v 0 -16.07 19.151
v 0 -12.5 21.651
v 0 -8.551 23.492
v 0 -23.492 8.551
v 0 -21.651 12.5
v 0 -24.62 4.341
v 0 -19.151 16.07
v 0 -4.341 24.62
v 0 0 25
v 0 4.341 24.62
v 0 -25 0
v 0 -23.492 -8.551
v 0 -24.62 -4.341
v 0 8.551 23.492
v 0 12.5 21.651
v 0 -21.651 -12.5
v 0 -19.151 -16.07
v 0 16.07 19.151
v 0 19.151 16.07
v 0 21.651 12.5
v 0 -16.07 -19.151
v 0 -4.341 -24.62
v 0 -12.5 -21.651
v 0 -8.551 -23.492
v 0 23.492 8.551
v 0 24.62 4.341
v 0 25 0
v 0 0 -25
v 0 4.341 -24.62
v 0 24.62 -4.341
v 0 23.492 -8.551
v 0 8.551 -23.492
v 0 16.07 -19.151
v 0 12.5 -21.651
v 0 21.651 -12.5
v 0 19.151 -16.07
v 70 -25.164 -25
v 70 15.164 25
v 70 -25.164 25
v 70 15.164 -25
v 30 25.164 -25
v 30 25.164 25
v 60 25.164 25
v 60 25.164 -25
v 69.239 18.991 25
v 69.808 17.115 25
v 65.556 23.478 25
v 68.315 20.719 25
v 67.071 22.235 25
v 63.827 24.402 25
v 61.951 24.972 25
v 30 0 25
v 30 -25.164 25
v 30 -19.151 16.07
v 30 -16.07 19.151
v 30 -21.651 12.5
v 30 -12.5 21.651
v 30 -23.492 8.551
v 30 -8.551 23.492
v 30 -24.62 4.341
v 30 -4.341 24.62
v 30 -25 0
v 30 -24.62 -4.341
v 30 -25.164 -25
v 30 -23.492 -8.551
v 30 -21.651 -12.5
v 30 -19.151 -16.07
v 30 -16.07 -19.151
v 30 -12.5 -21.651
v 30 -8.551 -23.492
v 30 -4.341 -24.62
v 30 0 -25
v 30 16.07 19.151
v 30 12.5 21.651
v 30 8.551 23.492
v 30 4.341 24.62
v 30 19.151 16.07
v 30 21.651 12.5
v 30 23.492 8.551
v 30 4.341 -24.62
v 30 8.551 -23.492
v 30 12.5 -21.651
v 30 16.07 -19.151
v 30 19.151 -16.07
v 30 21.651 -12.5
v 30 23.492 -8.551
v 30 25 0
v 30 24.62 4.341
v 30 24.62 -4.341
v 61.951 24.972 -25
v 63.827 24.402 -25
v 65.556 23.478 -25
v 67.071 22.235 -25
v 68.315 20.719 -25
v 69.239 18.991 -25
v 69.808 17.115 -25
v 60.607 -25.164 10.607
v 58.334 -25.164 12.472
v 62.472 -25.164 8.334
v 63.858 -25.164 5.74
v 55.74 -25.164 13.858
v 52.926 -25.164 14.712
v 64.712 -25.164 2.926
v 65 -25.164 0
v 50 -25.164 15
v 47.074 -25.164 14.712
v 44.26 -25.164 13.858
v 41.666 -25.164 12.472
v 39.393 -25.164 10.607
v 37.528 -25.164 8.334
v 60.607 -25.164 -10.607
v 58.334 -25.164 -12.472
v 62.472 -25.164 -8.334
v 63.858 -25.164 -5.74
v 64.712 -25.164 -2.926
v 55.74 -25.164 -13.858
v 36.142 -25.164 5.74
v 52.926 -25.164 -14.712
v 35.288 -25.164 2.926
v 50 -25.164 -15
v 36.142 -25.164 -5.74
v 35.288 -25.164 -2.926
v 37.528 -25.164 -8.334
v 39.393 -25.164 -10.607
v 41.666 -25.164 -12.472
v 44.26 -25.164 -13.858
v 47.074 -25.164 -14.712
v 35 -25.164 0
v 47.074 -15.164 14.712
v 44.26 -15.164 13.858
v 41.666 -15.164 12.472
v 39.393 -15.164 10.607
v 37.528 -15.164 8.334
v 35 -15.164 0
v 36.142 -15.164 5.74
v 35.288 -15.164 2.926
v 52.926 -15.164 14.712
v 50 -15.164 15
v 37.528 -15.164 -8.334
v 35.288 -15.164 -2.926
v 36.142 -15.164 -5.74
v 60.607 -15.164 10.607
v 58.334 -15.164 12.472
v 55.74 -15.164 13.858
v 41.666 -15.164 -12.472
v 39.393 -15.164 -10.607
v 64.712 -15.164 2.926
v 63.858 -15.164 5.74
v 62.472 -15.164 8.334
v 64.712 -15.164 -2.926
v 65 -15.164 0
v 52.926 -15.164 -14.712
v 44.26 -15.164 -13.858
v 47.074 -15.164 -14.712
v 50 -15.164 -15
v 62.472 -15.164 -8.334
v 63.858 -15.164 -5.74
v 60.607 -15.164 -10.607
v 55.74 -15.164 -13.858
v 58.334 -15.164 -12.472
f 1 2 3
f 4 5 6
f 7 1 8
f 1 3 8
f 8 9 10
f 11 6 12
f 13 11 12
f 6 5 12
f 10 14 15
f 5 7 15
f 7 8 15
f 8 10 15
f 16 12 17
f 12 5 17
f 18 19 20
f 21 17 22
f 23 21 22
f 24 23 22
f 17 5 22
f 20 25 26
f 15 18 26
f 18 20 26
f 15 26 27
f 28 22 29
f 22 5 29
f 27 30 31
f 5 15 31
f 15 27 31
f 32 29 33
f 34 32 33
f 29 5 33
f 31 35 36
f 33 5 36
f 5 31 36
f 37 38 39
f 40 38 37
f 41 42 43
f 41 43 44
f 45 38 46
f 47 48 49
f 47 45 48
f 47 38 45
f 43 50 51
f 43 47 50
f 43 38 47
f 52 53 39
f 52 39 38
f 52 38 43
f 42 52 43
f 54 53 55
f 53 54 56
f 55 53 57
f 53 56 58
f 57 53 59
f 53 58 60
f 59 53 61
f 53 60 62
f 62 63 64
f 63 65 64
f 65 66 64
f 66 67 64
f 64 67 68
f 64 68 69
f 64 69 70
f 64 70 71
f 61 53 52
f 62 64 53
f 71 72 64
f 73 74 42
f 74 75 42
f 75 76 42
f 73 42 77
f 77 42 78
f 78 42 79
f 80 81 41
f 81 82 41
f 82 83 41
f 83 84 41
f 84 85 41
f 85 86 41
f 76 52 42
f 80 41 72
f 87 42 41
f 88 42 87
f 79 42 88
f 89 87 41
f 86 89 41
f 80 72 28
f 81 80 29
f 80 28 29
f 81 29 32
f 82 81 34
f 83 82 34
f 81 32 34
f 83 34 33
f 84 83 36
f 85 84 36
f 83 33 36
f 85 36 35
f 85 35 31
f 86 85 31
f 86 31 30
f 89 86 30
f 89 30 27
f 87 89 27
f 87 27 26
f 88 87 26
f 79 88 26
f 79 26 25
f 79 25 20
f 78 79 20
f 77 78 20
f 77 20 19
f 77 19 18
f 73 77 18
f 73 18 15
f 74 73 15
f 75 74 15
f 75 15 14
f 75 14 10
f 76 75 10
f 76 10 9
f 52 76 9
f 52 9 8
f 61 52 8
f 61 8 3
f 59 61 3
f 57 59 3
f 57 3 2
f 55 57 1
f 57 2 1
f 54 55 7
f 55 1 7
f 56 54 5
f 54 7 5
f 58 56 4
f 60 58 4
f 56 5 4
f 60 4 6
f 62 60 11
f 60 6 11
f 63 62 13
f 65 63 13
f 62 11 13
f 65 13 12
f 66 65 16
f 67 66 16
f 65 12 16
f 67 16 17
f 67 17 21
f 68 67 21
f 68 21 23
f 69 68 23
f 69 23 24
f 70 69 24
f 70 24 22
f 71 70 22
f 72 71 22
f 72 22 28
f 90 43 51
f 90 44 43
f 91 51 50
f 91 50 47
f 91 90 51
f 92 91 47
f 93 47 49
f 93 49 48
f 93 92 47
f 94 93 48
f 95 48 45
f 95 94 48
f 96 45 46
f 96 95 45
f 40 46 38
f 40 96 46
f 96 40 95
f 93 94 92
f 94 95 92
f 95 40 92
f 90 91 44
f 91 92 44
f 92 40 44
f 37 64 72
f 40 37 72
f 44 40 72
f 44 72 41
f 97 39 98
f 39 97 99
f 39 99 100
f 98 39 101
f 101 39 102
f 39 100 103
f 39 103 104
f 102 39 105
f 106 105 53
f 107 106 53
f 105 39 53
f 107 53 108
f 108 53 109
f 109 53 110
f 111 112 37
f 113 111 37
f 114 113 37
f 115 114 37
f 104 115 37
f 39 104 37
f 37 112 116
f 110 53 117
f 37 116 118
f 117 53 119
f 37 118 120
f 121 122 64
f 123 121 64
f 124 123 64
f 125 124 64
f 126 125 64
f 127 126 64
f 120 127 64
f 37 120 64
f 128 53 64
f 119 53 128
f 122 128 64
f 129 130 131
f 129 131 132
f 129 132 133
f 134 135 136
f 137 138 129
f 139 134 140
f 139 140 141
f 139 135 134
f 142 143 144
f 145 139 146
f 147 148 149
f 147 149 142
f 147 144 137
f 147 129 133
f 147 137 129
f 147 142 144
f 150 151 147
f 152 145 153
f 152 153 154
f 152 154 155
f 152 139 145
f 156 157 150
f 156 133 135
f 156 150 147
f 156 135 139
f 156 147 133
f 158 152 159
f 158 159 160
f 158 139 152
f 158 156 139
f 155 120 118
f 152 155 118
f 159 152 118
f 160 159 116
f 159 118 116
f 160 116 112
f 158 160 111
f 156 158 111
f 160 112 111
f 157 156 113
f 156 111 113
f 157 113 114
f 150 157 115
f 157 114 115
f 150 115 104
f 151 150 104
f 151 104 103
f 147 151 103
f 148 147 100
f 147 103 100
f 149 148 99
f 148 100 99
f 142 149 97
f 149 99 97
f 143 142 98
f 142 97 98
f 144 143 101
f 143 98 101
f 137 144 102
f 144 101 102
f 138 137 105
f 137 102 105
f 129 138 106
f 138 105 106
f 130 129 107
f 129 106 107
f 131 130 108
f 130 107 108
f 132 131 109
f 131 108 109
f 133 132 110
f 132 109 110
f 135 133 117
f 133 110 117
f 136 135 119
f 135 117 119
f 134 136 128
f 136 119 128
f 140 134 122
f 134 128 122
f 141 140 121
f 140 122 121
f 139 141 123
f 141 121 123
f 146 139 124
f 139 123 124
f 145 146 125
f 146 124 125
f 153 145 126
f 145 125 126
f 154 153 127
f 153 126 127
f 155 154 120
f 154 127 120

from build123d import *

# Parameters (mm, degrees)
SKETCH1_R           = 25
BOSS_EXTRUDE1_DEPTH = 30
SKETCH2_W           = 50
SKETCH2_H           = 50.327363666
BOSS_EXTRUDE2_DEPTH = 40
FILLET1_R           = 10
SKETCH3_R           = 15
CUT_EXTRUDE1_DEPTH  = 10


with BuildPart() as part:
    # Sketch1 → Boss-Extrude1 (new body)
    with BuildSketch(Plane(origin=(0, 0, 0), x_dir=(0, 0, -1), z_dir=(1, 0, 0))):
        Circle(SKETCH1_R)
    extrude(amount=BOSS_EXTRUDE1_DEPTH)

    # Sketch2 → Boss-Extrude2 (add)
    with BuildSketch(Plane(origin=(30, 0, 0), x_dir=(0, 0, -1), z_dir=(1, 0, 0))):
        Rectangle(SKETCH2_W, SKETCH2_H)
    extrude(amount=BOSS_EXTRUDE2_DEPTH)

    # Fillet1
    fillet1_edges = [part.edges().sort_by_distance(p)[0] for p in [
        (70, 25.163681833, 0),
    ]]
    fillet(fillet1_edges, radius=FILLET1_R)

    # Sketch3 → Cut-Extrude1 (cut)
    with BuildSketch(Plane.XZ.offset(25.163681833)):
        with Locations(Location((50, 0, 0), (0, 0, 270))):
            Circle(SKETCH3_R)
    extrude(amount=-CUT_EXTRUDE1_DEPTH, mode=Mode.SUBTRACT)


solid = part.part
